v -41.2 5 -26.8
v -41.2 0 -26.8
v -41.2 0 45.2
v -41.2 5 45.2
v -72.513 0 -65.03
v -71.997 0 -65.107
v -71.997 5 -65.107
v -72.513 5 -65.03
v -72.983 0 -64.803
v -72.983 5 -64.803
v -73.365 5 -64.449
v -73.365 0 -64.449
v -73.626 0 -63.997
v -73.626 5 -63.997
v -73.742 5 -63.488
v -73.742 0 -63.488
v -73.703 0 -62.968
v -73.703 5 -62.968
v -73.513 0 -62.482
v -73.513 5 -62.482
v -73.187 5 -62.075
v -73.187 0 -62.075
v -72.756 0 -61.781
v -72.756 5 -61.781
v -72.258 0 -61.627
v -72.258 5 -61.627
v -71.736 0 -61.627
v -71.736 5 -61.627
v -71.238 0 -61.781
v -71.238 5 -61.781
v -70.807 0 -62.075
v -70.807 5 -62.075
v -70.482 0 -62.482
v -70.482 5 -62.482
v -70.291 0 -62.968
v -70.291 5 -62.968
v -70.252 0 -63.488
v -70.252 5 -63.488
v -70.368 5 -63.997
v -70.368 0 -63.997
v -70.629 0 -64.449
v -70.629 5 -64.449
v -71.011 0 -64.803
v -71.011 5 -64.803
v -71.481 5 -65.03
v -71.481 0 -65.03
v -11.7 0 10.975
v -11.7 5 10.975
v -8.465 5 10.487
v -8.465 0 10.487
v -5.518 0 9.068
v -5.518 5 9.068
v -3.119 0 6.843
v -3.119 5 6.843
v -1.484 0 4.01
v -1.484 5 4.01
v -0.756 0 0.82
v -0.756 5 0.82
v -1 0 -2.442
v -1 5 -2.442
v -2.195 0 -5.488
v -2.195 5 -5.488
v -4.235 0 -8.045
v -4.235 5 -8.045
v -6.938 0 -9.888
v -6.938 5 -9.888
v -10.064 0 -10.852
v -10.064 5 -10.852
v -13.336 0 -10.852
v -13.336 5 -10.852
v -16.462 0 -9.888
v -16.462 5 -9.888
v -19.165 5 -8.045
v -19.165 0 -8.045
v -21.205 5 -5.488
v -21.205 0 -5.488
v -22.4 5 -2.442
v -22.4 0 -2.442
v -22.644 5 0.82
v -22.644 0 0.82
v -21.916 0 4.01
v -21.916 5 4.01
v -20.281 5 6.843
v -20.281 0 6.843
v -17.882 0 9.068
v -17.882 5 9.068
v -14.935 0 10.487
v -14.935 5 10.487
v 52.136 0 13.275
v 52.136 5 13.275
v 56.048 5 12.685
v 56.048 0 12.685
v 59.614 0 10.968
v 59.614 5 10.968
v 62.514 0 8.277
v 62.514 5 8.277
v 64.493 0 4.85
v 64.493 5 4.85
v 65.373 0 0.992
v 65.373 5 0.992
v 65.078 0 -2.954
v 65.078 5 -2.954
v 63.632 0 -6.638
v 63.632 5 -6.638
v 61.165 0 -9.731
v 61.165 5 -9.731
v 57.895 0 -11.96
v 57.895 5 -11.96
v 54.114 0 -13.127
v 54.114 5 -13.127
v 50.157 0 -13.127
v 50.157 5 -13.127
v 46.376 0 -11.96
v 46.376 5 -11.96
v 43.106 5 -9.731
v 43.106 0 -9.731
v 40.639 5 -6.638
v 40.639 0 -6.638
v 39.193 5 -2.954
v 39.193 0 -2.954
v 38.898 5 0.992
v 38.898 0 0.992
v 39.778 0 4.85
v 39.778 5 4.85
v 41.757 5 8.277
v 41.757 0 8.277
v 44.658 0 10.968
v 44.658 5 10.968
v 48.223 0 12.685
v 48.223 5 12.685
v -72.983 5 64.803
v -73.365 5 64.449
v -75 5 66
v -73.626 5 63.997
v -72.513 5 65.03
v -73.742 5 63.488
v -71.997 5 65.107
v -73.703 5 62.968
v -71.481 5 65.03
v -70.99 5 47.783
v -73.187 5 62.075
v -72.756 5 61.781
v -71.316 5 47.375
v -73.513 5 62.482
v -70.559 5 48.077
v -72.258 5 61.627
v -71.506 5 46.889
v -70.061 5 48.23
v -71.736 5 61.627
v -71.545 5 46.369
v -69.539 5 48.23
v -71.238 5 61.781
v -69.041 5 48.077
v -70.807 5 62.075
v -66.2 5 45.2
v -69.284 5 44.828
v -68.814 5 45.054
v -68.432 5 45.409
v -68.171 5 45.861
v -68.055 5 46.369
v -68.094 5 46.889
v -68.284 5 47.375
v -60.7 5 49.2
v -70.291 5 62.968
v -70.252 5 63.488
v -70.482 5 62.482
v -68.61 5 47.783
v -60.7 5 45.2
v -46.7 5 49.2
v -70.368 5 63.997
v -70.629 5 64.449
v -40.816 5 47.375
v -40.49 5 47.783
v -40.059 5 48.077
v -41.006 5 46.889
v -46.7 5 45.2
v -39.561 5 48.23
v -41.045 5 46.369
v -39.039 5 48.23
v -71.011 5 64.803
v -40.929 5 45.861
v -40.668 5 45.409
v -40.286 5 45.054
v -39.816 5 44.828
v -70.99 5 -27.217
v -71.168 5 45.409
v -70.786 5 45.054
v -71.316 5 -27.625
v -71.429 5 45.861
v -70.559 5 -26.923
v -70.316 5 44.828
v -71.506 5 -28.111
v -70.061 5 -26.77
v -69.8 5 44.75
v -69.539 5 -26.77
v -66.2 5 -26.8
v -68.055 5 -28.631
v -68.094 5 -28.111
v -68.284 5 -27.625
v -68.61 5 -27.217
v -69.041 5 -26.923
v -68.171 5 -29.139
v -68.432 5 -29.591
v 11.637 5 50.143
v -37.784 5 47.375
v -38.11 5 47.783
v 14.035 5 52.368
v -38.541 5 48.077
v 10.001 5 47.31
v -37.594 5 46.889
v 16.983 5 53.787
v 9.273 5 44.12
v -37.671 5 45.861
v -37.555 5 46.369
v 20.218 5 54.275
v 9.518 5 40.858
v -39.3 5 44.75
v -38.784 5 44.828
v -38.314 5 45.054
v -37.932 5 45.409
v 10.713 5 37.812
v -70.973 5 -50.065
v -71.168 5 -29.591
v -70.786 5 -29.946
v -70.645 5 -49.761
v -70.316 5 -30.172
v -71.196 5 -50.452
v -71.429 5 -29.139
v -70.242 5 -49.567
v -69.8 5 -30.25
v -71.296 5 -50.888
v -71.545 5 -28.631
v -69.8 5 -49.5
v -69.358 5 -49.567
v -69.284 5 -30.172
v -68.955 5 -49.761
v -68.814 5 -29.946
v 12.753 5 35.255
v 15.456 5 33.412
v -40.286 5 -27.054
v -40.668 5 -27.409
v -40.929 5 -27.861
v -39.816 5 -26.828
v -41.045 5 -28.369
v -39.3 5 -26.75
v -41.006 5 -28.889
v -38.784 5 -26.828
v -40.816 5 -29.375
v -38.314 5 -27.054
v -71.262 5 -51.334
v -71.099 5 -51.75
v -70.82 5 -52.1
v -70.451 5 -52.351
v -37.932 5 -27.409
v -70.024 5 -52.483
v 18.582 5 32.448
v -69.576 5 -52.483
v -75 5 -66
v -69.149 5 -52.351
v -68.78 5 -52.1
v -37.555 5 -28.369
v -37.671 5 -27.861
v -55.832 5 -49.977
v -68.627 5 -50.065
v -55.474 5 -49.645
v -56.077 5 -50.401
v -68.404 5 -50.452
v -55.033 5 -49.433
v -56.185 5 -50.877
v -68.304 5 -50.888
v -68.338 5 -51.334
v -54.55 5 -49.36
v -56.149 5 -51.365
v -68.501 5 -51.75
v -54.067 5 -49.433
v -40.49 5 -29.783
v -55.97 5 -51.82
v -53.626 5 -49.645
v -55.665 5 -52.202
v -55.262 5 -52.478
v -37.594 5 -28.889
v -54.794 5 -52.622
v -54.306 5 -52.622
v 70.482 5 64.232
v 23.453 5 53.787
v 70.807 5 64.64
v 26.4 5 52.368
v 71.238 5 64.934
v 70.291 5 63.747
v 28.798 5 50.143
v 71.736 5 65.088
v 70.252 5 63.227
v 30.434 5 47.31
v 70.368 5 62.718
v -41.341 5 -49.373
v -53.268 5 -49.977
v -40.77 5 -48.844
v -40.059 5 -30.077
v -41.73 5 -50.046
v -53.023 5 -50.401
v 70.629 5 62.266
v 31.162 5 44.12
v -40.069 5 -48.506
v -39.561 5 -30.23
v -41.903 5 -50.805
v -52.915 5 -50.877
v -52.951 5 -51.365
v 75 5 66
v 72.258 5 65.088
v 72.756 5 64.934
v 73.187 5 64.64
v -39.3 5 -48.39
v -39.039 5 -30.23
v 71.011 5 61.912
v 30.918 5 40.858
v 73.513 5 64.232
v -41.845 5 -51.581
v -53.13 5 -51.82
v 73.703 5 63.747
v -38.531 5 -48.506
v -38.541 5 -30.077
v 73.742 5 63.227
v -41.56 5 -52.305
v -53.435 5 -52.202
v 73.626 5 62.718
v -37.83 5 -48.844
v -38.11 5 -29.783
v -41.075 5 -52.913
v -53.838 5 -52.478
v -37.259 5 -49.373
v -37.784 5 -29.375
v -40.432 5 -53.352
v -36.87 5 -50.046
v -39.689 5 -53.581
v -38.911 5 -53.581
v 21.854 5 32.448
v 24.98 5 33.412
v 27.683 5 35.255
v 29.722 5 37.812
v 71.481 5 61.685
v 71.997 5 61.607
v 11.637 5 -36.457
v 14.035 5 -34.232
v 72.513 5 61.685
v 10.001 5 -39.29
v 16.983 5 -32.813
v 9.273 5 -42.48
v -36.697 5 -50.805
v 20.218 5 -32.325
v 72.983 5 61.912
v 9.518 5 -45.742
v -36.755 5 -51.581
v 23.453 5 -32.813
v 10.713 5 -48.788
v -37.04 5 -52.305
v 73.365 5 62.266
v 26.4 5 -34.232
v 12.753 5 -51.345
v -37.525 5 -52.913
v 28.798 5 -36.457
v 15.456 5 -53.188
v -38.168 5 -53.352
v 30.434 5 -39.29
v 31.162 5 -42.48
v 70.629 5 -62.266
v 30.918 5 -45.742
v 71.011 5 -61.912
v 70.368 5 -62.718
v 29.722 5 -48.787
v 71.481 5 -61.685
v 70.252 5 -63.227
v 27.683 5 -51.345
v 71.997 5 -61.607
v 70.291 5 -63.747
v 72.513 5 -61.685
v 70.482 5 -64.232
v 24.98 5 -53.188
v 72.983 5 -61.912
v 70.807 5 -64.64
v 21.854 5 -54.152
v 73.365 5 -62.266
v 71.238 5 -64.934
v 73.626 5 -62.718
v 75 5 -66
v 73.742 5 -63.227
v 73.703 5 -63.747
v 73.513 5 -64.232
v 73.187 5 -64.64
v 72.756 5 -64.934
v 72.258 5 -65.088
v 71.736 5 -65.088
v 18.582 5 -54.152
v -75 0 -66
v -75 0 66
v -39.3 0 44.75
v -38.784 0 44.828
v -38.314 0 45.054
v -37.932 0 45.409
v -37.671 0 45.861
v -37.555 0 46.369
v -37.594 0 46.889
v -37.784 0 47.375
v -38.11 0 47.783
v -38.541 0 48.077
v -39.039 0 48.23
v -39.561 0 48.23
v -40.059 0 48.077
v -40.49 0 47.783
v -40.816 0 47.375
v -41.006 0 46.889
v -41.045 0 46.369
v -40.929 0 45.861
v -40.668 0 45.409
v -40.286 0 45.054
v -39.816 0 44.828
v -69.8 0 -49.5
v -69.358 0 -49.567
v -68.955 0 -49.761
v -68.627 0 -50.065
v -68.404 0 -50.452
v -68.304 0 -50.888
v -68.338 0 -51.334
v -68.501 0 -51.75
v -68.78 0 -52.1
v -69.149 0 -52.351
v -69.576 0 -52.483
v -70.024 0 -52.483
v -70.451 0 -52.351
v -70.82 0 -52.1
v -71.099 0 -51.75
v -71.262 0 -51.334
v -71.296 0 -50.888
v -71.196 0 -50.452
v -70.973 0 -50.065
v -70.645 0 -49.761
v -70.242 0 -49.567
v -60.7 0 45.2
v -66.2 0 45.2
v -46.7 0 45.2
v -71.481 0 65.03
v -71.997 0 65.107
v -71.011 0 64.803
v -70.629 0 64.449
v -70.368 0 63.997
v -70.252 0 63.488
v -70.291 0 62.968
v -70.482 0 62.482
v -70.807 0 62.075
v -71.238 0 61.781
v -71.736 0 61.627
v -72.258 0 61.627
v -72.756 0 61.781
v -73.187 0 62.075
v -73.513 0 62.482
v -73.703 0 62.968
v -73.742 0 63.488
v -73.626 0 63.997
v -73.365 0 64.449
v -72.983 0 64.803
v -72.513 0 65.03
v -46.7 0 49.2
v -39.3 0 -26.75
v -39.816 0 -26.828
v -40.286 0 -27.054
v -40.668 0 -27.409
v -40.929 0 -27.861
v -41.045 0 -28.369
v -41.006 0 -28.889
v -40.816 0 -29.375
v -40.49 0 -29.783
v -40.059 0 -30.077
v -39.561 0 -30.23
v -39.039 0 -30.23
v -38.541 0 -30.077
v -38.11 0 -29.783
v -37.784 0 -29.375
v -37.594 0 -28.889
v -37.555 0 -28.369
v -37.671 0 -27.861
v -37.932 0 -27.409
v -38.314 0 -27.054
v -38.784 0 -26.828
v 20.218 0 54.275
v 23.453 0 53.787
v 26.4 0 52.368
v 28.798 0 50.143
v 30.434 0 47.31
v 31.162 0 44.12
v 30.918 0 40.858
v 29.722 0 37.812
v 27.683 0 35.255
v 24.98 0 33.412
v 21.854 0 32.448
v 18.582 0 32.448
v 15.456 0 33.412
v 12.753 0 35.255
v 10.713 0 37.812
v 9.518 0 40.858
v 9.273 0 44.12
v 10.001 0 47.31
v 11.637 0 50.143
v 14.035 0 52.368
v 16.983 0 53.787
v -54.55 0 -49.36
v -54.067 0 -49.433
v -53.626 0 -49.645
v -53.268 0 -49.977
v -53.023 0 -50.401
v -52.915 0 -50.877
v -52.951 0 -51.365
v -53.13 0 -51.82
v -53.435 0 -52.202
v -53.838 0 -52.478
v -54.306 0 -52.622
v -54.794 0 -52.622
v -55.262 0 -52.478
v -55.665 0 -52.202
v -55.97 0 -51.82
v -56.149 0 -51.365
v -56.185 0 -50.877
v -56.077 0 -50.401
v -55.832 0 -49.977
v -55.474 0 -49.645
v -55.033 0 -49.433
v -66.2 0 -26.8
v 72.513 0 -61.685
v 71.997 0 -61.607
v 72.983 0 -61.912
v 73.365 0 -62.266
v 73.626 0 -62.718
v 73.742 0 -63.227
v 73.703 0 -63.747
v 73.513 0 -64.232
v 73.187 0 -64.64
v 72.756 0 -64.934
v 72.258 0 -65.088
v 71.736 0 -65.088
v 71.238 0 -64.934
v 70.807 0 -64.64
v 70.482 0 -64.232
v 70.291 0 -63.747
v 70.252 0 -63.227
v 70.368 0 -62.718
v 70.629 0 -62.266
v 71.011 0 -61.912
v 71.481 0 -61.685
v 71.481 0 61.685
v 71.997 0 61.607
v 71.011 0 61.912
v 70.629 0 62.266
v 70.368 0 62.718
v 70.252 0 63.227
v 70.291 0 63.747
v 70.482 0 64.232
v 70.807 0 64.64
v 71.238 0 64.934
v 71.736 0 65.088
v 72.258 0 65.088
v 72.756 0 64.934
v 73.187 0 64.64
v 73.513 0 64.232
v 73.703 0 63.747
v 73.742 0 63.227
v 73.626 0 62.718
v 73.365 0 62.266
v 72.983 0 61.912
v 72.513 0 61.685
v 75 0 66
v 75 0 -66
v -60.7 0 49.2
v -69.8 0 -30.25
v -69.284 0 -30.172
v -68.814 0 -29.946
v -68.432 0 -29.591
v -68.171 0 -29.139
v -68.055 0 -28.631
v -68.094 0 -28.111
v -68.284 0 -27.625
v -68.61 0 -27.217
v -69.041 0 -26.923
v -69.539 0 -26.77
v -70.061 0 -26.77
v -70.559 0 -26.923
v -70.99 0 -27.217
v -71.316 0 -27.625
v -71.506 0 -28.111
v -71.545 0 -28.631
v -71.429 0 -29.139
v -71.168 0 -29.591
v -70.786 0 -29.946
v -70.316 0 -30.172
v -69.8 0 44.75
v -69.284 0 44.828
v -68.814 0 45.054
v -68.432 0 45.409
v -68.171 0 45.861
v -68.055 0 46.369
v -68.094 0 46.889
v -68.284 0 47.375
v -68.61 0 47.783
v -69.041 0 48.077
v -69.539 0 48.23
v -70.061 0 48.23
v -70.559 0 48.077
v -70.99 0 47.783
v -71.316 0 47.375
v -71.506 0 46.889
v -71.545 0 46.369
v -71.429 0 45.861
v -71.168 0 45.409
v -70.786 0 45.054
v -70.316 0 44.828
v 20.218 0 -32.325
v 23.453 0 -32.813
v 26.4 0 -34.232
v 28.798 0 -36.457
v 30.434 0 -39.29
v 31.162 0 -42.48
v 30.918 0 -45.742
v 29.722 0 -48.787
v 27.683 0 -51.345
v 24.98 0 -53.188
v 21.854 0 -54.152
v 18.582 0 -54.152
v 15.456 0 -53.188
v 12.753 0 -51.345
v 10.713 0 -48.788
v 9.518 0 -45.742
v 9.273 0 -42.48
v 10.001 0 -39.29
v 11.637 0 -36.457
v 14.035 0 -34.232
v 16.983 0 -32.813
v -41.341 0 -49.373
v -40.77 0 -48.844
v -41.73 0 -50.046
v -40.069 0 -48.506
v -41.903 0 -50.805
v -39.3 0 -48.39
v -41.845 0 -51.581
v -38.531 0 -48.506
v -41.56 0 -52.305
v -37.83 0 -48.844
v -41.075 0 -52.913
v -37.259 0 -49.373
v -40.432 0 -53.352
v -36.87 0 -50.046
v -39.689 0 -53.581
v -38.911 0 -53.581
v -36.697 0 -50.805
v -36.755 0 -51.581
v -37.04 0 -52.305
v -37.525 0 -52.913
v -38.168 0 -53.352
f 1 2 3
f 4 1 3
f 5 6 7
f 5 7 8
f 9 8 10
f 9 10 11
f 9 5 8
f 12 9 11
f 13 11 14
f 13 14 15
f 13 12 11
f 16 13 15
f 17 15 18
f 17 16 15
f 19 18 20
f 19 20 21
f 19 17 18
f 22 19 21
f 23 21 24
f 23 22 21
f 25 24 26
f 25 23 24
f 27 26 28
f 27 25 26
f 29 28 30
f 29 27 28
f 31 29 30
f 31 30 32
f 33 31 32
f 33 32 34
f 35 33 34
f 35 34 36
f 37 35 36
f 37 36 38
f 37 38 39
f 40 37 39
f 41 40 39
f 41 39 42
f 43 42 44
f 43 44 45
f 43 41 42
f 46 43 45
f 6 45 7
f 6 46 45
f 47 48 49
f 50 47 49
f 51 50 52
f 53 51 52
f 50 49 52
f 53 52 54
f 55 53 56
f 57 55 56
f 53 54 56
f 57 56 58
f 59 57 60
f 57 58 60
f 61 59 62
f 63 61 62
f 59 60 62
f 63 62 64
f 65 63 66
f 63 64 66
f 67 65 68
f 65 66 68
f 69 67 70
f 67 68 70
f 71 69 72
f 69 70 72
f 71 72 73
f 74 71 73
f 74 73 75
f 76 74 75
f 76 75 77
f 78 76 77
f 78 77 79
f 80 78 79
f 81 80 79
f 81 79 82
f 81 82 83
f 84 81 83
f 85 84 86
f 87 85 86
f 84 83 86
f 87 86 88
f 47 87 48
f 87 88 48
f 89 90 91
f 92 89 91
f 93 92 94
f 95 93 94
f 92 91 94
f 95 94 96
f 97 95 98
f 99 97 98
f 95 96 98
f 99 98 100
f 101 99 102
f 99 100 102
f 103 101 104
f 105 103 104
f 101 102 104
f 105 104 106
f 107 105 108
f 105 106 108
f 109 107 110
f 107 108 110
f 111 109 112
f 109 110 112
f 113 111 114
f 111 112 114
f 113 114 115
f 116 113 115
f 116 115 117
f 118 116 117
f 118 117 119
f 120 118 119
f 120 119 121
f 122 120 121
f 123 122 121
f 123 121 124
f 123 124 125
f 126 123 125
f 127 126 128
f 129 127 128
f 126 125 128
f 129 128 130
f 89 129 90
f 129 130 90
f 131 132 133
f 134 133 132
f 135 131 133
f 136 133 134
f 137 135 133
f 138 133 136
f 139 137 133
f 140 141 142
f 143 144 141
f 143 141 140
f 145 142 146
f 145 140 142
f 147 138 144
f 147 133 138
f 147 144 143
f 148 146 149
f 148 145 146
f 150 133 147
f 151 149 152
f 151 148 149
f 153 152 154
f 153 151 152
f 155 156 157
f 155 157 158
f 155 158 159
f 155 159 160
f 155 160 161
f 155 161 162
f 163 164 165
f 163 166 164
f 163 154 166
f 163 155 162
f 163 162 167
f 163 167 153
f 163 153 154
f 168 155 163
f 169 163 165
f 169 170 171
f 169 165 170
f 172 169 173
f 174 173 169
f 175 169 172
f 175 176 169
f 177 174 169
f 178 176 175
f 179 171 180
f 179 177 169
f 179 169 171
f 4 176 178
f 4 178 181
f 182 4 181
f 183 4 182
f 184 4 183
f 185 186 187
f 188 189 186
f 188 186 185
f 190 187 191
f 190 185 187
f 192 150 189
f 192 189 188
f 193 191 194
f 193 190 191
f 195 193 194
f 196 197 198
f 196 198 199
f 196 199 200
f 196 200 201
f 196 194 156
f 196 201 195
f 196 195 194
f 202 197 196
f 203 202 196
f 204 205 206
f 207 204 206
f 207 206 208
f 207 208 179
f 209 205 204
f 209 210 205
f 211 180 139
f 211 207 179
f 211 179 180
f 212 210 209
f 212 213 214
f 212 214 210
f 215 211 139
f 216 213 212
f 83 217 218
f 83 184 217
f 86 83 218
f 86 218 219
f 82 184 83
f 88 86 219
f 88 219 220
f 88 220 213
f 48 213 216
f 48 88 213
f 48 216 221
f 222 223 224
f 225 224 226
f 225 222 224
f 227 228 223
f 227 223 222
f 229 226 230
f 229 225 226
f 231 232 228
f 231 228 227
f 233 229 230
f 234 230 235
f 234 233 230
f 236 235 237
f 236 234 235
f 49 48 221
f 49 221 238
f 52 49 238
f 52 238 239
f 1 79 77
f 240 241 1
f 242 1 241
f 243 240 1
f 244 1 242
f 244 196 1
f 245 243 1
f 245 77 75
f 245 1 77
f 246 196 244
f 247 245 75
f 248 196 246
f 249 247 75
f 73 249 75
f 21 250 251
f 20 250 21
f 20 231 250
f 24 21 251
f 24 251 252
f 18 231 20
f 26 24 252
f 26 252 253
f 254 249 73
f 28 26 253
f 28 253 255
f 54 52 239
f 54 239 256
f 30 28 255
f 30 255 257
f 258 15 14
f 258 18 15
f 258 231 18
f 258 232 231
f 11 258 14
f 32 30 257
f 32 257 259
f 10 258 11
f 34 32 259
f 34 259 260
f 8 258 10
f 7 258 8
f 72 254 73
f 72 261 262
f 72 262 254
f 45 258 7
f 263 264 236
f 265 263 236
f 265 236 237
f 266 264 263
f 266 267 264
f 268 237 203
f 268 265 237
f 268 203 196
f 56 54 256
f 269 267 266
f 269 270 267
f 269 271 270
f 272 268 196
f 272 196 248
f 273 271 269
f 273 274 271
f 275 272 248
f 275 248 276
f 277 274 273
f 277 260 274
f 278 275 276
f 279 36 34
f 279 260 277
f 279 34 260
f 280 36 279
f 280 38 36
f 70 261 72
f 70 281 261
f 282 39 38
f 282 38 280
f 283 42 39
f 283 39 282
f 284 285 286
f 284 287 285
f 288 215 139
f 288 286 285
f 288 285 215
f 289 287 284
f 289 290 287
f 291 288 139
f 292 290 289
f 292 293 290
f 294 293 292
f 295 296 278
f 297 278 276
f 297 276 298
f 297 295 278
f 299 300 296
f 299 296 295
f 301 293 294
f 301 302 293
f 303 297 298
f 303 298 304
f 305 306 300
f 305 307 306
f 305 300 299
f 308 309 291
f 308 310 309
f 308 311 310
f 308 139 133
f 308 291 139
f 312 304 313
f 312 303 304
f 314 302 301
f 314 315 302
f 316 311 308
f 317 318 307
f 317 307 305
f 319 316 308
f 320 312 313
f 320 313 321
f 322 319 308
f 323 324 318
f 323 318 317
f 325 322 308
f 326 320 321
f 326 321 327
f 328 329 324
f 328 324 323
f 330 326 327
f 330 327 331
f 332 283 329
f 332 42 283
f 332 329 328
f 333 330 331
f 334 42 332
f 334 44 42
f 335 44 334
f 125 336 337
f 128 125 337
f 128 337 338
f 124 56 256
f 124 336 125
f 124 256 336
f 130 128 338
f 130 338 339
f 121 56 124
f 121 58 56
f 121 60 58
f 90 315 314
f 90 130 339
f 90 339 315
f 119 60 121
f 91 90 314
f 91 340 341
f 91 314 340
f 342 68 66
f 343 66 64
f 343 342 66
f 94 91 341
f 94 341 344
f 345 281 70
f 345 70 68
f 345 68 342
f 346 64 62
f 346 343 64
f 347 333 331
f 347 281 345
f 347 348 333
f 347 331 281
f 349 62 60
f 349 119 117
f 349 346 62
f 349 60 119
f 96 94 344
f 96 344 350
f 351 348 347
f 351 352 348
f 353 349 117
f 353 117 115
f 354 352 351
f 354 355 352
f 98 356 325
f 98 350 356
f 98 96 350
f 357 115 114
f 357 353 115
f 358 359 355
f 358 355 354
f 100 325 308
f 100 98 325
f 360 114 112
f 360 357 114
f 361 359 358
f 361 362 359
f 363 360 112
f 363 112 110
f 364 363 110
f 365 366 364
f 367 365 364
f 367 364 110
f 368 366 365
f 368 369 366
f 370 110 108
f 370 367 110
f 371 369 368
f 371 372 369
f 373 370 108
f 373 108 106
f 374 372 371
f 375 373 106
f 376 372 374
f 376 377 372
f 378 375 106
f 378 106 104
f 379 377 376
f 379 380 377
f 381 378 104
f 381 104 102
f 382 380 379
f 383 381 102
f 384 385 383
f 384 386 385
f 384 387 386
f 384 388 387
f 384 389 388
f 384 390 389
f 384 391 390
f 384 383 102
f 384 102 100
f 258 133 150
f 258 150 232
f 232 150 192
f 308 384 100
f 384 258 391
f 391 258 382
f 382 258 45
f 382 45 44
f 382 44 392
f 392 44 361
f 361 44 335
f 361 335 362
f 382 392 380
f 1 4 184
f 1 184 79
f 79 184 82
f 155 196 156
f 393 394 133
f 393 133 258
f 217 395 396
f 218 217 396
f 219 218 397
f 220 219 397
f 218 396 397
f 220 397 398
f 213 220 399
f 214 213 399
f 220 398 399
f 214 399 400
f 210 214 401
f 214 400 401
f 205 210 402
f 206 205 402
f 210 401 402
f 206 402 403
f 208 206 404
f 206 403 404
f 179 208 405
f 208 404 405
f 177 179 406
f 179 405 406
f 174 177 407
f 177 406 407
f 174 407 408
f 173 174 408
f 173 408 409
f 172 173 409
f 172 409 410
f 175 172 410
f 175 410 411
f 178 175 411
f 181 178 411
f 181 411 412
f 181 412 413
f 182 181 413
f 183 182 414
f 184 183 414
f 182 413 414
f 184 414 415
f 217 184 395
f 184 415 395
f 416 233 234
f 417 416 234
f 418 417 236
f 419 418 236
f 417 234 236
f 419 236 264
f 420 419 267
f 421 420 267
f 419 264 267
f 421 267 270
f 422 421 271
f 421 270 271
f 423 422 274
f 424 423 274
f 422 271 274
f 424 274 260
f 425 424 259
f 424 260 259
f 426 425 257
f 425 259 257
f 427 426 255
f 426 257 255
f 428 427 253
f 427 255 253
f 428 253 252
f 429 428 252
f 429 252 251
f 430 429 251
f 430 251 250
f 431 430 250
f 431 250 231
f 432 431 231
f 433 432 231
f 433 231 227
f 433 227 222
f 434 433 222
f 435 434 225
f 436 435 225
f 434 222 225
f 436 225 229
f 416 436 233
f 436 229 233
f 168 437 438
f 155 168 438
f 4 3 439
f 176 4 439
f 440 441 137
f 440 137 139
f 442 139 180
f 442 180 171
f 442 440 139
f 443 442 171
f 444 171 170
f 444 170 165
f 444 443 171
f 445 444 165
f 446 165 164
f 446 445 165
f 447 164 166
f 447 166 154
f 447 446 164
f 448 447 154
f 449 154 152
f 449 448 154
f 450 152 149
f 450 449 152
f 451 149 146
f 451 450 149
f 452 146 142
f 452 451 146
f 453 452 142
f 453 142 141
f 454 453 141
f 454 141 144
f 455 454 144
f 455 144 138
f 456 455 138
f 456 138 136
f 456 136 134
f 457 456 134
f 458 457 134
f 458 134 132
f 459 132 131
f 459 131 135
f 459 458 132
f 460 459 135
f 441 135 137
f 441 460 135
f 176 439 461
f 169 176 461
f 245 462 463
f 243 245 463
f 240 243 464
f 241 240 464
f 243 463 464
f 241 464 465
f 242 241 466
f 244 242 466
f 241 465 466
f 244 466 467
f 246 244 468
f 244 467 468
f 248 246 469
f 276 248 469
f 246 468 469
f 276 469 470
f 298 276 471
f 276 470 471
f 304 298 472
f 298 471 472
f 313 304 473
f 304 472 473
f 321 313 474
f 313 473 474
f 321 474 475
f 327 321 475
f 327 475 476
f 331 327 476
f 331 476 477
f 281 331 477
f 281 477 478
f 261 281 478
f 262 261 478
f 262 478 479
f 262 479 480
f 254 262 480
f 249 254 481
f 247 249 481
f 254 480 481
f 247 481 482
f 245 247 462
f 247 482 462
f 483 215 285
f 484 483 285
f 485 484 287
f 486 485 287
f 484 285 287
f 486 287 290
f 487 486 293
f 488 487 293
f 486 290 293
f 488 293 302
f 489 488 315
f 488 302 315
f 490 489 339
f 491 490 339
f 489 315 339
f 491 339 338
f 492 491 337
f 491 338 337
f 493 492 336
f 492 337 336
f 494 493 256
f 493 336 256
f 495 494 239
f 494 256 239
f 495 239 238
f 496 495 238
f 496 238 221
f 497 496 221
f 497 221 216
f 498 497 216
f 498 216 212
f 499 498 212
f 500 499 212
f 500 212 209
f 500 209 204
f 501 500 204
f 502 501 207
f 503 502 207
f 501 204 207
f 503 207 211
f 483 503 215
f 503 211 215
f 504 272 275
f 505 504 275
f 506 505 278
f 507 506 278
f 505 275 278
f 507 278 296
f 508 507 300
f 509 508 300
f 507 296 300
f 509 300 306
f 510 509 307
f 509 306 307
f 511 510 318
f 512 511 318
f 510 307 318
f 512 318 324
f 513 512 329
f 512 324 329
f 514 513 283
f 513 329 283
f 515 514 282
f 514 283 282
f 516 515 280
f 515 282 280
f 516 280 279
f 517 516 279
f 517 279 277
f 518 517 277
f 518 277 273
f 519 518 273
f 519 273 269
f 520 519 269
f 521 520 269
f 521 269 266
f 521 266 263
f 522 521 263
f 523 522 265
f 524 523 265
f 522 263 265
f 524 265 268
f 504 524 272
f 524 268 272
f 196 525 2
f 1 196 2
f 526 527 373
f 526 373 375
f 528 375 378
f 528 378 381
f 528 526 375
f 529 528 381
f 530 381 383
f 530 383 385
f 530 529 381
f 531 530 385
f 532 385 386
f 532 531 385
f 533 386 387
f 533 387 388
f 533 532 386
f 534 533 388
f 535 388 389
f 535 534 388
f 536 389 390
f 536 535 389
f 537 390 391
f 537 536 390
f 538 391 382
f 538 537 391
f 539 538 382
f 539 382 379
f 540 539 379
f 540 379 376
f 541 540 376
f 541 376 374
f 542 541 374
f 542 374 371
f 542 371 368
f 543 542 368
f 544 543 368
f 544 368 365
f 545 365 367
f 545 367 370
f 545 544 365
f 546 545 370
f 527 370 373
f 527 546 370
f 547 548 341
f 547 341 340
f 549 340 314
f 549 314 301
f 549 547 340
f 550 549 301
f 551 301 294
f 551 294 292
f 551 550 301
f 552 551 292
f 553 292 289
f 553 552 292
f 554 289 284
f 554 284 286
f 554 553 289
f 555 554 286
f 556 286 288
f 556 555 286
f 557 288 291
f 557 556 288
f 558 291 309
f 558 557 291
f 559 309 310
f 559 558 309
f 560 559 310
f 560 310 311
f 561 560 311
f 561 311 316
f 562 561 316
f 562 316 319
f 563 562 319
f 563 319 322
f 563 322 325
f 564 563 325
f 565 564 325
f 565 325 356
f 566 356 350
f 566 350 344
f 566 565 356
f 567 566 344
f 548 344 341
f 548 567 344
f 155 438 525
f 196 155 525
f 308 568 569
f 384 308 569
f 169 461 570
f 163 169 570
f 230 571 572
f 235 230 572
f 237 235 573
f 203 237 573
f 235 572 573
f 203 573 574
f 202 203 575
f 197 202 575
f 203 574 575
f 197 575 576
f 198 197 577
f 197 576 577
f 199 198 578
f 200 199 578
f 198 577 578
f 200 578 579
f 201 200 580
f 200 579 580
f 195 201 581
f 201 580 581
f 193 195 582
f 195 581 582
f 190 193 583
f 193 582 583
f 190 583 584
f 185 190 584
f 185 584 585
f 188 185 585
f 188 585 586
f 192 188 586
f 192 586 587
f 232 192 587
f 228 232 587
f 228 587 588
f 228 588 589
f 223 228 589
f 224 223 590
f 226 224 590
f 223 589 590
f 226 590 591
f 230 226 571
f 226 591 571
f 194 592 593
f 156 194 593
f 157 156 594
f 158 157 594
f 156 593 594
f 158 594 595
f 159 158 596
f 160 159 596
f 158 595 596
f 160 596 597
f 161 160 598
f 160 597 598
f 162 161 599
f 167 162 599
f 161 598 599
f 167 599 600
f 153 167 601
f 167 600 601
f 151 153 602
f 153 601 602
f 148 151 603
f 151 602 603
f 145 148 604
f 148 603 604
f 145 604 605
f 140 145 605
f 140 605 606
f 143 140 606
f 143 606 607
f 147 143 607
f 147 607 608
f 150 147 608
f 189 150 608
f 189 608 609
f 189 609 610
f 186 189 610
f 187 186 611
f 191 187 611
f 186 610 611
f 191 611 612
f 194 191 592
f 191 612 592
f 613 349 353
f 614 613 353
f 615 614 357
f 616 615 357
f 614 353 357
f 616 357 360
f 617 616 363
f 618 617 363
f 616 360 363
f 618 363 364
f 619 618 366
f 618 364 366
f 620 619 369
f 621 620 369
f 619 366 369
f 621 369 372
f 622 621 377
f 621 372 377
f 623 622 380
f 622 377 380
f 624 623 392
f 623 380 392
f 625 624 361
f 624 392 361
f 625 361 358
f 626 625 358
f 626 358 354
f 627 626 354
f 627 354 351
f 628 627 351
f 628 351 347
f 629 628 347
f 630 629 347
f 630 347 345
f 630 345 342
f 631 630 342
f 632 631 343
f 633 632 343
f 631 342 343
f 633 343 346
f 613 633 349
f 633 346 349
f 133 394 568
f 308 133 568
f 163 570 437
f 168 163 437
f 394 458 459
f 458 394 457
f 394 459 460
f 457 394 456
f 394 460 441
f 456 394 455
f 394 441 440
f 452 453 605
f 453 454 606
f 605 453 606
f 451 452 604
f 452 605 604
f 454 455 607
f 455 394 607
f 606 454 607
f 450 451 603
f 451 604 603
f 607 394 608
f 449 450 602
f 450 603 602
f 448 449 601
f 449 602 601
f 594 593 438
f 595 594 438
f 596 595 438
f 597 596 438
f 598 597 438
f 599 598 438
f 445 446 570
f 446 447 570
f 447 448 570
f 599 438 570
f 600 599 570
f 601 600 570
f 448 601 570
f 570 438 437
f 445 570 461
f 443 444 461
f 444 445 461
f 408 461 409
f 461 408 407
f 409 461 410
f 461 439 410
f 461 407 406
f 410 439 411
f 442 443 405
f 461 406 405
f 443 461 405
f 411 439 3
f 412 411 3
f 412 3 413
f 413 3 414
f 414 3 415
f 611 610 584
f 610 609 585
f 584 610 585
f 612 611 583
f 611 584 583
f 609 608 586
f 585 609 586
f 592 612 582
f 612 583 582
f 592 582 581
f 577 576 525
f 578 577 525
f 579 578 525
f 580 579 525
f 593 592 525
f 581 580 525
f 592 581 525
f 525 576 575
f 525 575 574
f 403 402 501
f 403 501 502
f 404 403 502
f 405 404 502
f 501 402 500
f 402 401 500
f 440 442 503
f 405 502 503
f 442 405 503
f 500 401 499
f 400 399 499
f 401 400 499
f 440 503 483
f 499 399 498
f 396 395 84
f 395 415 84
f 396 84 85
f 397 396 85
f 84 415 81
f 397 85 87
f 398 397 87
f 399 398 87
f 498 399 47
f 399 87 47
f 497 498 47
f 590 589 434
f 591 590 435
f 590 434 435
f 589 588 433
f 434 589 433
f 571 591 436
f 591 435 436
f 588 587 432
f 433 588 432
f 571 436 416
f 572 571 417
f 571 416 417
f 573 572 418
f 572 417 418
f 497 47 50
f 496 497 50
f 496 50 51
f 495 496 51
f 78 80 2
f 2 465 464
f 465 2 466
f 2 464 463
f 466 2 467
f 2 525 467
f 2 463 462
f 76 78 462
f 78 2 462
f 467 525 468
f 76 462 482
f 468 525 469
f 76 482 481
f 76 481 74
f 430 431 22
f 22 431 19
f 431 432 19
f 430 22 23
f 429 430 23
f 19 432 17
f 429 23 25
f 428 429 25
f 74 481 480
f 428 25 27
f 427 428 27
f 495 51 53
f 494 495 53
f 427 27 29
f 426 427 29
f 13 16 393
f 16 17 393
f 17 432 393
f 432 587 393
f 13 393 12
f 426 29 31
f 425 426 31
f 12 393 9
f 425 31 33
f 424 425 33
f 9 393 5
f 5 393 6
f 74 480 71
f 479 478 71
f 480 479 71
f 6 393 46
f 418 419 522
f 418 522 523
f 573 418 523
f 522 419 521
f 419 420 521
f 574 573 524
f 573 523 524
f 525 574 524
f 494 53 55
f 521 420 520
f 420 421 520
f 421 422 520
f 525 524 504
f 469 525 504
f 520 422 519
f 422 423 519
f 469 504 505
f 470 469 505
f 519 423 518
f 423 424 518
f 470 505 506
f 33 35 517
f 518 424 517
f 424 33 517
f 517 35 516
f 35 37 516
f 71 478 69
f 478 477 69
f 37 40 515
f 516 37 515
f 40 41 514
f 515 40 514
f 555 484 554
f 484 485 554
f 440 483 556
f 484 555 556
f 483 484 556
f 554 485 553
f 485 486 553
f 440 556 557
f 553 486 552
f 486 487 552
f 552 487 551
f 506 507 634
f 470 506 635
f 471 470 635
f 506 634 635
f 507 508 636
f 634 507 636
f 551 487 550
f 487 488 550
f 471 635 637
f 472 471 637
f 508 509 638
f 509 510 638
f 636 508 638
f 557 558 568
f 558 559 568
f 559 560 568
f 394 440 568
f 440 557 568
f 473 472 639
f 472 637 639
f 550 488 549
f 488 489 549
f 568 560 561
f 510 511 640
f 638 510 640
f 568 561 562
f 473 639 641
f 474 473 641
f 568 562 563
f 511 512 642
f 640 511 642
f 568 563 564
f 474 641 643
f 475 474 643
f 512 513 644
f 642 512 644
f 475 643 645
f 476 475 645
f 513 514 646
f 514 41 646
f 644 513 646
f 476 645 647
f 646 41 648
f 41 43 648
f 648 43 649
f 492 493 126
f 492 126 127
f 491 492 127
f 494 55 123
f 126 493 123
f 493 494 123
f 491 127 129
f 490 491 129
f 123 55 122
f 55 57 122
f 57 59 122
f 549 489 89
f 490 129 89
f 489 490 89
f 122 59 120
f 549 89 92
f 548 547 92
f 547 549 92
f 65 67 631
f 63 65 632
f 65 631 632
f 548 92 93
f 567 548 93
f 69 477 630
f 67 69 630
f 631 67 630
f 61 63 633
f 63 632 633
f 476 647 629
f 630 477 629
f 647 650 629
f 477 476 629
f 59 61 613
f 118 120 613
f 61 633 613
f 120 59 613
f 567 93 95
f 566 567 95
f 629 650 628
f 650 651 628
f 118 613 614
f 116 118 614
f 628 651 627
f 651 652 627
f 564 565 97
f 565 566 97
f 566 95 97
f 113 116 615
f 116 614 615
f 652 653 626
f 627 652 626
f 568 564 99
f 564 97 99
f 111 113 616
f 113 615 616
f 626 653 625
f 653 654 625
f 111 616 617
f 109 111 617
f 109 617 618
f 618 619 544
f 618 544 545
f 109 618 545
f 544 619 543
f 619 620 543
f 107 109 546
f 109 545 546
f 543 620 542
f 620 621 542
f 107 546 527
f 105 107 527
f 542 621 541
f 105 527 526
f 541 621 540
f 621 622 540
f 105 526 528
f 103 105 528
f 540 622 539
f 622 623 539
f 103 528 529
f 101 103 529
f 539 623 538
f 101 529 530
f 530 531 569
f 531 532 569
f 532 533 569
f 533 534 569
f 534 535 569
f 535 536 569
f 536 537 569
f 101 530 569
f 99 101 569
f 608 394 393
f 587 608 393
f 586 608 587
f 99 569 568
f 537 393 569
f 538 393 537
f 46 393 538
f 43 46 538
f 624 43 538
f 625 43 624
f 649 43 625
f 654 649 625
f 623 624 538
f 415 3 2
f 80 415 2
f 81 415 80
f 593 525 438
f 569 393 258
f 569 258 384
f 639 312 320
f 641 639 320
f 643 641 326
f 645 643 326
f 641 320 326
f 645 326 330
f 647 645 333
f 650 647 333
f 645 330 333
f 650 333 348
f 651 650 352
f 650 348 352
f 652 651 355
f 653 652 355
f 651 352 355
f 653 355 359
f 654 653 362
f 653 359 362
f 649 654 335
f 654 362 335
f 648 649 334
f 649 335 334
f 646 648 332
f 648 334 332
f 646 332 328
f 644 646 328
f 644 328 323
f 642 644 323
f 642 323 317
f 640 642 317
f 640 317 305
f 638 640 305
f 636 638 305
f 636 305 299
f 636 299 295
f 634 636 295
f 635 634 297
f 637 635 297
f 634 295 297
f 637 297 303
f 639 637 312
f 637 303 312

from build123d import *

# Parameters (mm, degrees)
SKETCH1_W           = 150
SKETCH1_H           = 132
SKETCH1_R           = 1.75
BOSS_EXTRUDE1_DEPTH = 5
SKETCH2_R           = 1.75
CUT_EXTRUDE1_DEPTH  = 5
SKETCH3_R           = 1.5
SKETCH3_R_2         = 1.64
SKETCH3_R_3         = 2.61
CUT_EXTRUDE2_DEPTH  = 5
SKETCH4_R           = 10.975
SKETCH4_R_2         = 13.275
CUT_EXTRUDE3_DEPTH  = 5


with BuildPart() as part:
    # Sketch1 → Boss-Extrude1 (new body)
    with BuildSketch(Plane(origin=(0, 0, 0), x_dir=(1, 0, 0), z_dir=(0, 1, 0))):
        Rectangle(SKETCH1_W, SKETCH1_H)
        with Locations(Location((71.997145932, 63.35748842, 0), (0, 0, 270))):
            Circle(SKETCH1_R, mode=Mode.SUBTRACT)
        with Locations(Location((71.997145932, -63.35748842, 0), (0, 0, 90))):
            Circle(SKETCH1_R, mode=Mode.SUBTRACT)
        with Locations(Location((-71.997145932, 63.35748842, 0), (0, 0, 90))):
            Circle(SKETCH1_R, mode=Mode.SUBTRACT)
        with Locations(Location((-71.997145932, -63.35748842, 0), (0, 0, 270))):
            Circle(SKETCH1_R, mode=Mode.SUBTRACT)
    extrude(amount=BOSS_EXTRUDE1_DEPTH)

    # Sketch2 → Cut-Extrude1 (cut)
    with BuildSketch(Plane.XZ):
        Polygon((-41.2, -26.8), (-41.2, 45.2), (-46.7, 45.2), (-46.7, 49.2), (-60.7, 49.2), (-60.7, 45.2), (-66.2, 45.2), (-66.2, -26.8), align=None)
        with Locations(Location((-39.3, 46.5, 0), (0, 0, 270))):
            Circle(SKETCH2_R)
        with Locations(Location((-39.3, -28.5, 0), (0, 0, 90))):
            Circle(SKETCH2_R)
        with Locations(Location((-69.8, 46.5, 0), (0, 0, 270))):
            Circle(SKETCH2_R)
        with Locations(Location((-69.8, -28.5, 0), (0, 0, 270))):
            Circle(SKETCH2_R)
    extrude(amount=-CUT_EXTRUDE1_DEPTH, mode=Mode.SUBTRACT)

    # Sketch3 → Cut-Extrude2 (cut)
    with BuildSketch(Plane(origin=(0, 5, 0), x_dir=(1, 0, 0), z_dir=(0, 1, 0))):
        with Locations(Location((-69.8, 51, 0), (0, 0, 270))):
            Circle(SKETCH3_R)
        with Locations(Location((-54.55, 51, 0), (0, 0, 270))):
            Circle(SKETCH3_R_2)
        with Locations(Location((-39.3, 51, 0), (0, 0, 270))):
            Circle(SKETCH3_R_3)
    extrude(amount=-CUT_EXTRUDE2_DEPTH, mode=Mode.SUBTRACT)

    # Sketch4 → Cut-Extrude3 (cut)
    with BuildSketch(Plane(origin=(0, 5, 0), x_dir=(1, 0, 0), z_dir=(0, 1, 0))):
        with Locations(Location((-11.7, 0, 0), (0, 0, 270))):
            Circle(SKETCH4_R)
        with Locations(Location((20.217797346, 43.3, 0), (0, 0, 270))):
            Circle(SKETCH4_R)
        with Locations(Location((20.217797346, -43.3, 0), (0, 0, 270))):
            Circle(SKETCH4_R)
        with Locations(Location((52.135594693, 0, 0), (0, 0, 270))):
            Circle(SKETCH4_R_2)
    extrude(amount=-CUT_EXTRUDE3_DEPTH, mode=Mode.SUBTRACT)


solid = part.part
